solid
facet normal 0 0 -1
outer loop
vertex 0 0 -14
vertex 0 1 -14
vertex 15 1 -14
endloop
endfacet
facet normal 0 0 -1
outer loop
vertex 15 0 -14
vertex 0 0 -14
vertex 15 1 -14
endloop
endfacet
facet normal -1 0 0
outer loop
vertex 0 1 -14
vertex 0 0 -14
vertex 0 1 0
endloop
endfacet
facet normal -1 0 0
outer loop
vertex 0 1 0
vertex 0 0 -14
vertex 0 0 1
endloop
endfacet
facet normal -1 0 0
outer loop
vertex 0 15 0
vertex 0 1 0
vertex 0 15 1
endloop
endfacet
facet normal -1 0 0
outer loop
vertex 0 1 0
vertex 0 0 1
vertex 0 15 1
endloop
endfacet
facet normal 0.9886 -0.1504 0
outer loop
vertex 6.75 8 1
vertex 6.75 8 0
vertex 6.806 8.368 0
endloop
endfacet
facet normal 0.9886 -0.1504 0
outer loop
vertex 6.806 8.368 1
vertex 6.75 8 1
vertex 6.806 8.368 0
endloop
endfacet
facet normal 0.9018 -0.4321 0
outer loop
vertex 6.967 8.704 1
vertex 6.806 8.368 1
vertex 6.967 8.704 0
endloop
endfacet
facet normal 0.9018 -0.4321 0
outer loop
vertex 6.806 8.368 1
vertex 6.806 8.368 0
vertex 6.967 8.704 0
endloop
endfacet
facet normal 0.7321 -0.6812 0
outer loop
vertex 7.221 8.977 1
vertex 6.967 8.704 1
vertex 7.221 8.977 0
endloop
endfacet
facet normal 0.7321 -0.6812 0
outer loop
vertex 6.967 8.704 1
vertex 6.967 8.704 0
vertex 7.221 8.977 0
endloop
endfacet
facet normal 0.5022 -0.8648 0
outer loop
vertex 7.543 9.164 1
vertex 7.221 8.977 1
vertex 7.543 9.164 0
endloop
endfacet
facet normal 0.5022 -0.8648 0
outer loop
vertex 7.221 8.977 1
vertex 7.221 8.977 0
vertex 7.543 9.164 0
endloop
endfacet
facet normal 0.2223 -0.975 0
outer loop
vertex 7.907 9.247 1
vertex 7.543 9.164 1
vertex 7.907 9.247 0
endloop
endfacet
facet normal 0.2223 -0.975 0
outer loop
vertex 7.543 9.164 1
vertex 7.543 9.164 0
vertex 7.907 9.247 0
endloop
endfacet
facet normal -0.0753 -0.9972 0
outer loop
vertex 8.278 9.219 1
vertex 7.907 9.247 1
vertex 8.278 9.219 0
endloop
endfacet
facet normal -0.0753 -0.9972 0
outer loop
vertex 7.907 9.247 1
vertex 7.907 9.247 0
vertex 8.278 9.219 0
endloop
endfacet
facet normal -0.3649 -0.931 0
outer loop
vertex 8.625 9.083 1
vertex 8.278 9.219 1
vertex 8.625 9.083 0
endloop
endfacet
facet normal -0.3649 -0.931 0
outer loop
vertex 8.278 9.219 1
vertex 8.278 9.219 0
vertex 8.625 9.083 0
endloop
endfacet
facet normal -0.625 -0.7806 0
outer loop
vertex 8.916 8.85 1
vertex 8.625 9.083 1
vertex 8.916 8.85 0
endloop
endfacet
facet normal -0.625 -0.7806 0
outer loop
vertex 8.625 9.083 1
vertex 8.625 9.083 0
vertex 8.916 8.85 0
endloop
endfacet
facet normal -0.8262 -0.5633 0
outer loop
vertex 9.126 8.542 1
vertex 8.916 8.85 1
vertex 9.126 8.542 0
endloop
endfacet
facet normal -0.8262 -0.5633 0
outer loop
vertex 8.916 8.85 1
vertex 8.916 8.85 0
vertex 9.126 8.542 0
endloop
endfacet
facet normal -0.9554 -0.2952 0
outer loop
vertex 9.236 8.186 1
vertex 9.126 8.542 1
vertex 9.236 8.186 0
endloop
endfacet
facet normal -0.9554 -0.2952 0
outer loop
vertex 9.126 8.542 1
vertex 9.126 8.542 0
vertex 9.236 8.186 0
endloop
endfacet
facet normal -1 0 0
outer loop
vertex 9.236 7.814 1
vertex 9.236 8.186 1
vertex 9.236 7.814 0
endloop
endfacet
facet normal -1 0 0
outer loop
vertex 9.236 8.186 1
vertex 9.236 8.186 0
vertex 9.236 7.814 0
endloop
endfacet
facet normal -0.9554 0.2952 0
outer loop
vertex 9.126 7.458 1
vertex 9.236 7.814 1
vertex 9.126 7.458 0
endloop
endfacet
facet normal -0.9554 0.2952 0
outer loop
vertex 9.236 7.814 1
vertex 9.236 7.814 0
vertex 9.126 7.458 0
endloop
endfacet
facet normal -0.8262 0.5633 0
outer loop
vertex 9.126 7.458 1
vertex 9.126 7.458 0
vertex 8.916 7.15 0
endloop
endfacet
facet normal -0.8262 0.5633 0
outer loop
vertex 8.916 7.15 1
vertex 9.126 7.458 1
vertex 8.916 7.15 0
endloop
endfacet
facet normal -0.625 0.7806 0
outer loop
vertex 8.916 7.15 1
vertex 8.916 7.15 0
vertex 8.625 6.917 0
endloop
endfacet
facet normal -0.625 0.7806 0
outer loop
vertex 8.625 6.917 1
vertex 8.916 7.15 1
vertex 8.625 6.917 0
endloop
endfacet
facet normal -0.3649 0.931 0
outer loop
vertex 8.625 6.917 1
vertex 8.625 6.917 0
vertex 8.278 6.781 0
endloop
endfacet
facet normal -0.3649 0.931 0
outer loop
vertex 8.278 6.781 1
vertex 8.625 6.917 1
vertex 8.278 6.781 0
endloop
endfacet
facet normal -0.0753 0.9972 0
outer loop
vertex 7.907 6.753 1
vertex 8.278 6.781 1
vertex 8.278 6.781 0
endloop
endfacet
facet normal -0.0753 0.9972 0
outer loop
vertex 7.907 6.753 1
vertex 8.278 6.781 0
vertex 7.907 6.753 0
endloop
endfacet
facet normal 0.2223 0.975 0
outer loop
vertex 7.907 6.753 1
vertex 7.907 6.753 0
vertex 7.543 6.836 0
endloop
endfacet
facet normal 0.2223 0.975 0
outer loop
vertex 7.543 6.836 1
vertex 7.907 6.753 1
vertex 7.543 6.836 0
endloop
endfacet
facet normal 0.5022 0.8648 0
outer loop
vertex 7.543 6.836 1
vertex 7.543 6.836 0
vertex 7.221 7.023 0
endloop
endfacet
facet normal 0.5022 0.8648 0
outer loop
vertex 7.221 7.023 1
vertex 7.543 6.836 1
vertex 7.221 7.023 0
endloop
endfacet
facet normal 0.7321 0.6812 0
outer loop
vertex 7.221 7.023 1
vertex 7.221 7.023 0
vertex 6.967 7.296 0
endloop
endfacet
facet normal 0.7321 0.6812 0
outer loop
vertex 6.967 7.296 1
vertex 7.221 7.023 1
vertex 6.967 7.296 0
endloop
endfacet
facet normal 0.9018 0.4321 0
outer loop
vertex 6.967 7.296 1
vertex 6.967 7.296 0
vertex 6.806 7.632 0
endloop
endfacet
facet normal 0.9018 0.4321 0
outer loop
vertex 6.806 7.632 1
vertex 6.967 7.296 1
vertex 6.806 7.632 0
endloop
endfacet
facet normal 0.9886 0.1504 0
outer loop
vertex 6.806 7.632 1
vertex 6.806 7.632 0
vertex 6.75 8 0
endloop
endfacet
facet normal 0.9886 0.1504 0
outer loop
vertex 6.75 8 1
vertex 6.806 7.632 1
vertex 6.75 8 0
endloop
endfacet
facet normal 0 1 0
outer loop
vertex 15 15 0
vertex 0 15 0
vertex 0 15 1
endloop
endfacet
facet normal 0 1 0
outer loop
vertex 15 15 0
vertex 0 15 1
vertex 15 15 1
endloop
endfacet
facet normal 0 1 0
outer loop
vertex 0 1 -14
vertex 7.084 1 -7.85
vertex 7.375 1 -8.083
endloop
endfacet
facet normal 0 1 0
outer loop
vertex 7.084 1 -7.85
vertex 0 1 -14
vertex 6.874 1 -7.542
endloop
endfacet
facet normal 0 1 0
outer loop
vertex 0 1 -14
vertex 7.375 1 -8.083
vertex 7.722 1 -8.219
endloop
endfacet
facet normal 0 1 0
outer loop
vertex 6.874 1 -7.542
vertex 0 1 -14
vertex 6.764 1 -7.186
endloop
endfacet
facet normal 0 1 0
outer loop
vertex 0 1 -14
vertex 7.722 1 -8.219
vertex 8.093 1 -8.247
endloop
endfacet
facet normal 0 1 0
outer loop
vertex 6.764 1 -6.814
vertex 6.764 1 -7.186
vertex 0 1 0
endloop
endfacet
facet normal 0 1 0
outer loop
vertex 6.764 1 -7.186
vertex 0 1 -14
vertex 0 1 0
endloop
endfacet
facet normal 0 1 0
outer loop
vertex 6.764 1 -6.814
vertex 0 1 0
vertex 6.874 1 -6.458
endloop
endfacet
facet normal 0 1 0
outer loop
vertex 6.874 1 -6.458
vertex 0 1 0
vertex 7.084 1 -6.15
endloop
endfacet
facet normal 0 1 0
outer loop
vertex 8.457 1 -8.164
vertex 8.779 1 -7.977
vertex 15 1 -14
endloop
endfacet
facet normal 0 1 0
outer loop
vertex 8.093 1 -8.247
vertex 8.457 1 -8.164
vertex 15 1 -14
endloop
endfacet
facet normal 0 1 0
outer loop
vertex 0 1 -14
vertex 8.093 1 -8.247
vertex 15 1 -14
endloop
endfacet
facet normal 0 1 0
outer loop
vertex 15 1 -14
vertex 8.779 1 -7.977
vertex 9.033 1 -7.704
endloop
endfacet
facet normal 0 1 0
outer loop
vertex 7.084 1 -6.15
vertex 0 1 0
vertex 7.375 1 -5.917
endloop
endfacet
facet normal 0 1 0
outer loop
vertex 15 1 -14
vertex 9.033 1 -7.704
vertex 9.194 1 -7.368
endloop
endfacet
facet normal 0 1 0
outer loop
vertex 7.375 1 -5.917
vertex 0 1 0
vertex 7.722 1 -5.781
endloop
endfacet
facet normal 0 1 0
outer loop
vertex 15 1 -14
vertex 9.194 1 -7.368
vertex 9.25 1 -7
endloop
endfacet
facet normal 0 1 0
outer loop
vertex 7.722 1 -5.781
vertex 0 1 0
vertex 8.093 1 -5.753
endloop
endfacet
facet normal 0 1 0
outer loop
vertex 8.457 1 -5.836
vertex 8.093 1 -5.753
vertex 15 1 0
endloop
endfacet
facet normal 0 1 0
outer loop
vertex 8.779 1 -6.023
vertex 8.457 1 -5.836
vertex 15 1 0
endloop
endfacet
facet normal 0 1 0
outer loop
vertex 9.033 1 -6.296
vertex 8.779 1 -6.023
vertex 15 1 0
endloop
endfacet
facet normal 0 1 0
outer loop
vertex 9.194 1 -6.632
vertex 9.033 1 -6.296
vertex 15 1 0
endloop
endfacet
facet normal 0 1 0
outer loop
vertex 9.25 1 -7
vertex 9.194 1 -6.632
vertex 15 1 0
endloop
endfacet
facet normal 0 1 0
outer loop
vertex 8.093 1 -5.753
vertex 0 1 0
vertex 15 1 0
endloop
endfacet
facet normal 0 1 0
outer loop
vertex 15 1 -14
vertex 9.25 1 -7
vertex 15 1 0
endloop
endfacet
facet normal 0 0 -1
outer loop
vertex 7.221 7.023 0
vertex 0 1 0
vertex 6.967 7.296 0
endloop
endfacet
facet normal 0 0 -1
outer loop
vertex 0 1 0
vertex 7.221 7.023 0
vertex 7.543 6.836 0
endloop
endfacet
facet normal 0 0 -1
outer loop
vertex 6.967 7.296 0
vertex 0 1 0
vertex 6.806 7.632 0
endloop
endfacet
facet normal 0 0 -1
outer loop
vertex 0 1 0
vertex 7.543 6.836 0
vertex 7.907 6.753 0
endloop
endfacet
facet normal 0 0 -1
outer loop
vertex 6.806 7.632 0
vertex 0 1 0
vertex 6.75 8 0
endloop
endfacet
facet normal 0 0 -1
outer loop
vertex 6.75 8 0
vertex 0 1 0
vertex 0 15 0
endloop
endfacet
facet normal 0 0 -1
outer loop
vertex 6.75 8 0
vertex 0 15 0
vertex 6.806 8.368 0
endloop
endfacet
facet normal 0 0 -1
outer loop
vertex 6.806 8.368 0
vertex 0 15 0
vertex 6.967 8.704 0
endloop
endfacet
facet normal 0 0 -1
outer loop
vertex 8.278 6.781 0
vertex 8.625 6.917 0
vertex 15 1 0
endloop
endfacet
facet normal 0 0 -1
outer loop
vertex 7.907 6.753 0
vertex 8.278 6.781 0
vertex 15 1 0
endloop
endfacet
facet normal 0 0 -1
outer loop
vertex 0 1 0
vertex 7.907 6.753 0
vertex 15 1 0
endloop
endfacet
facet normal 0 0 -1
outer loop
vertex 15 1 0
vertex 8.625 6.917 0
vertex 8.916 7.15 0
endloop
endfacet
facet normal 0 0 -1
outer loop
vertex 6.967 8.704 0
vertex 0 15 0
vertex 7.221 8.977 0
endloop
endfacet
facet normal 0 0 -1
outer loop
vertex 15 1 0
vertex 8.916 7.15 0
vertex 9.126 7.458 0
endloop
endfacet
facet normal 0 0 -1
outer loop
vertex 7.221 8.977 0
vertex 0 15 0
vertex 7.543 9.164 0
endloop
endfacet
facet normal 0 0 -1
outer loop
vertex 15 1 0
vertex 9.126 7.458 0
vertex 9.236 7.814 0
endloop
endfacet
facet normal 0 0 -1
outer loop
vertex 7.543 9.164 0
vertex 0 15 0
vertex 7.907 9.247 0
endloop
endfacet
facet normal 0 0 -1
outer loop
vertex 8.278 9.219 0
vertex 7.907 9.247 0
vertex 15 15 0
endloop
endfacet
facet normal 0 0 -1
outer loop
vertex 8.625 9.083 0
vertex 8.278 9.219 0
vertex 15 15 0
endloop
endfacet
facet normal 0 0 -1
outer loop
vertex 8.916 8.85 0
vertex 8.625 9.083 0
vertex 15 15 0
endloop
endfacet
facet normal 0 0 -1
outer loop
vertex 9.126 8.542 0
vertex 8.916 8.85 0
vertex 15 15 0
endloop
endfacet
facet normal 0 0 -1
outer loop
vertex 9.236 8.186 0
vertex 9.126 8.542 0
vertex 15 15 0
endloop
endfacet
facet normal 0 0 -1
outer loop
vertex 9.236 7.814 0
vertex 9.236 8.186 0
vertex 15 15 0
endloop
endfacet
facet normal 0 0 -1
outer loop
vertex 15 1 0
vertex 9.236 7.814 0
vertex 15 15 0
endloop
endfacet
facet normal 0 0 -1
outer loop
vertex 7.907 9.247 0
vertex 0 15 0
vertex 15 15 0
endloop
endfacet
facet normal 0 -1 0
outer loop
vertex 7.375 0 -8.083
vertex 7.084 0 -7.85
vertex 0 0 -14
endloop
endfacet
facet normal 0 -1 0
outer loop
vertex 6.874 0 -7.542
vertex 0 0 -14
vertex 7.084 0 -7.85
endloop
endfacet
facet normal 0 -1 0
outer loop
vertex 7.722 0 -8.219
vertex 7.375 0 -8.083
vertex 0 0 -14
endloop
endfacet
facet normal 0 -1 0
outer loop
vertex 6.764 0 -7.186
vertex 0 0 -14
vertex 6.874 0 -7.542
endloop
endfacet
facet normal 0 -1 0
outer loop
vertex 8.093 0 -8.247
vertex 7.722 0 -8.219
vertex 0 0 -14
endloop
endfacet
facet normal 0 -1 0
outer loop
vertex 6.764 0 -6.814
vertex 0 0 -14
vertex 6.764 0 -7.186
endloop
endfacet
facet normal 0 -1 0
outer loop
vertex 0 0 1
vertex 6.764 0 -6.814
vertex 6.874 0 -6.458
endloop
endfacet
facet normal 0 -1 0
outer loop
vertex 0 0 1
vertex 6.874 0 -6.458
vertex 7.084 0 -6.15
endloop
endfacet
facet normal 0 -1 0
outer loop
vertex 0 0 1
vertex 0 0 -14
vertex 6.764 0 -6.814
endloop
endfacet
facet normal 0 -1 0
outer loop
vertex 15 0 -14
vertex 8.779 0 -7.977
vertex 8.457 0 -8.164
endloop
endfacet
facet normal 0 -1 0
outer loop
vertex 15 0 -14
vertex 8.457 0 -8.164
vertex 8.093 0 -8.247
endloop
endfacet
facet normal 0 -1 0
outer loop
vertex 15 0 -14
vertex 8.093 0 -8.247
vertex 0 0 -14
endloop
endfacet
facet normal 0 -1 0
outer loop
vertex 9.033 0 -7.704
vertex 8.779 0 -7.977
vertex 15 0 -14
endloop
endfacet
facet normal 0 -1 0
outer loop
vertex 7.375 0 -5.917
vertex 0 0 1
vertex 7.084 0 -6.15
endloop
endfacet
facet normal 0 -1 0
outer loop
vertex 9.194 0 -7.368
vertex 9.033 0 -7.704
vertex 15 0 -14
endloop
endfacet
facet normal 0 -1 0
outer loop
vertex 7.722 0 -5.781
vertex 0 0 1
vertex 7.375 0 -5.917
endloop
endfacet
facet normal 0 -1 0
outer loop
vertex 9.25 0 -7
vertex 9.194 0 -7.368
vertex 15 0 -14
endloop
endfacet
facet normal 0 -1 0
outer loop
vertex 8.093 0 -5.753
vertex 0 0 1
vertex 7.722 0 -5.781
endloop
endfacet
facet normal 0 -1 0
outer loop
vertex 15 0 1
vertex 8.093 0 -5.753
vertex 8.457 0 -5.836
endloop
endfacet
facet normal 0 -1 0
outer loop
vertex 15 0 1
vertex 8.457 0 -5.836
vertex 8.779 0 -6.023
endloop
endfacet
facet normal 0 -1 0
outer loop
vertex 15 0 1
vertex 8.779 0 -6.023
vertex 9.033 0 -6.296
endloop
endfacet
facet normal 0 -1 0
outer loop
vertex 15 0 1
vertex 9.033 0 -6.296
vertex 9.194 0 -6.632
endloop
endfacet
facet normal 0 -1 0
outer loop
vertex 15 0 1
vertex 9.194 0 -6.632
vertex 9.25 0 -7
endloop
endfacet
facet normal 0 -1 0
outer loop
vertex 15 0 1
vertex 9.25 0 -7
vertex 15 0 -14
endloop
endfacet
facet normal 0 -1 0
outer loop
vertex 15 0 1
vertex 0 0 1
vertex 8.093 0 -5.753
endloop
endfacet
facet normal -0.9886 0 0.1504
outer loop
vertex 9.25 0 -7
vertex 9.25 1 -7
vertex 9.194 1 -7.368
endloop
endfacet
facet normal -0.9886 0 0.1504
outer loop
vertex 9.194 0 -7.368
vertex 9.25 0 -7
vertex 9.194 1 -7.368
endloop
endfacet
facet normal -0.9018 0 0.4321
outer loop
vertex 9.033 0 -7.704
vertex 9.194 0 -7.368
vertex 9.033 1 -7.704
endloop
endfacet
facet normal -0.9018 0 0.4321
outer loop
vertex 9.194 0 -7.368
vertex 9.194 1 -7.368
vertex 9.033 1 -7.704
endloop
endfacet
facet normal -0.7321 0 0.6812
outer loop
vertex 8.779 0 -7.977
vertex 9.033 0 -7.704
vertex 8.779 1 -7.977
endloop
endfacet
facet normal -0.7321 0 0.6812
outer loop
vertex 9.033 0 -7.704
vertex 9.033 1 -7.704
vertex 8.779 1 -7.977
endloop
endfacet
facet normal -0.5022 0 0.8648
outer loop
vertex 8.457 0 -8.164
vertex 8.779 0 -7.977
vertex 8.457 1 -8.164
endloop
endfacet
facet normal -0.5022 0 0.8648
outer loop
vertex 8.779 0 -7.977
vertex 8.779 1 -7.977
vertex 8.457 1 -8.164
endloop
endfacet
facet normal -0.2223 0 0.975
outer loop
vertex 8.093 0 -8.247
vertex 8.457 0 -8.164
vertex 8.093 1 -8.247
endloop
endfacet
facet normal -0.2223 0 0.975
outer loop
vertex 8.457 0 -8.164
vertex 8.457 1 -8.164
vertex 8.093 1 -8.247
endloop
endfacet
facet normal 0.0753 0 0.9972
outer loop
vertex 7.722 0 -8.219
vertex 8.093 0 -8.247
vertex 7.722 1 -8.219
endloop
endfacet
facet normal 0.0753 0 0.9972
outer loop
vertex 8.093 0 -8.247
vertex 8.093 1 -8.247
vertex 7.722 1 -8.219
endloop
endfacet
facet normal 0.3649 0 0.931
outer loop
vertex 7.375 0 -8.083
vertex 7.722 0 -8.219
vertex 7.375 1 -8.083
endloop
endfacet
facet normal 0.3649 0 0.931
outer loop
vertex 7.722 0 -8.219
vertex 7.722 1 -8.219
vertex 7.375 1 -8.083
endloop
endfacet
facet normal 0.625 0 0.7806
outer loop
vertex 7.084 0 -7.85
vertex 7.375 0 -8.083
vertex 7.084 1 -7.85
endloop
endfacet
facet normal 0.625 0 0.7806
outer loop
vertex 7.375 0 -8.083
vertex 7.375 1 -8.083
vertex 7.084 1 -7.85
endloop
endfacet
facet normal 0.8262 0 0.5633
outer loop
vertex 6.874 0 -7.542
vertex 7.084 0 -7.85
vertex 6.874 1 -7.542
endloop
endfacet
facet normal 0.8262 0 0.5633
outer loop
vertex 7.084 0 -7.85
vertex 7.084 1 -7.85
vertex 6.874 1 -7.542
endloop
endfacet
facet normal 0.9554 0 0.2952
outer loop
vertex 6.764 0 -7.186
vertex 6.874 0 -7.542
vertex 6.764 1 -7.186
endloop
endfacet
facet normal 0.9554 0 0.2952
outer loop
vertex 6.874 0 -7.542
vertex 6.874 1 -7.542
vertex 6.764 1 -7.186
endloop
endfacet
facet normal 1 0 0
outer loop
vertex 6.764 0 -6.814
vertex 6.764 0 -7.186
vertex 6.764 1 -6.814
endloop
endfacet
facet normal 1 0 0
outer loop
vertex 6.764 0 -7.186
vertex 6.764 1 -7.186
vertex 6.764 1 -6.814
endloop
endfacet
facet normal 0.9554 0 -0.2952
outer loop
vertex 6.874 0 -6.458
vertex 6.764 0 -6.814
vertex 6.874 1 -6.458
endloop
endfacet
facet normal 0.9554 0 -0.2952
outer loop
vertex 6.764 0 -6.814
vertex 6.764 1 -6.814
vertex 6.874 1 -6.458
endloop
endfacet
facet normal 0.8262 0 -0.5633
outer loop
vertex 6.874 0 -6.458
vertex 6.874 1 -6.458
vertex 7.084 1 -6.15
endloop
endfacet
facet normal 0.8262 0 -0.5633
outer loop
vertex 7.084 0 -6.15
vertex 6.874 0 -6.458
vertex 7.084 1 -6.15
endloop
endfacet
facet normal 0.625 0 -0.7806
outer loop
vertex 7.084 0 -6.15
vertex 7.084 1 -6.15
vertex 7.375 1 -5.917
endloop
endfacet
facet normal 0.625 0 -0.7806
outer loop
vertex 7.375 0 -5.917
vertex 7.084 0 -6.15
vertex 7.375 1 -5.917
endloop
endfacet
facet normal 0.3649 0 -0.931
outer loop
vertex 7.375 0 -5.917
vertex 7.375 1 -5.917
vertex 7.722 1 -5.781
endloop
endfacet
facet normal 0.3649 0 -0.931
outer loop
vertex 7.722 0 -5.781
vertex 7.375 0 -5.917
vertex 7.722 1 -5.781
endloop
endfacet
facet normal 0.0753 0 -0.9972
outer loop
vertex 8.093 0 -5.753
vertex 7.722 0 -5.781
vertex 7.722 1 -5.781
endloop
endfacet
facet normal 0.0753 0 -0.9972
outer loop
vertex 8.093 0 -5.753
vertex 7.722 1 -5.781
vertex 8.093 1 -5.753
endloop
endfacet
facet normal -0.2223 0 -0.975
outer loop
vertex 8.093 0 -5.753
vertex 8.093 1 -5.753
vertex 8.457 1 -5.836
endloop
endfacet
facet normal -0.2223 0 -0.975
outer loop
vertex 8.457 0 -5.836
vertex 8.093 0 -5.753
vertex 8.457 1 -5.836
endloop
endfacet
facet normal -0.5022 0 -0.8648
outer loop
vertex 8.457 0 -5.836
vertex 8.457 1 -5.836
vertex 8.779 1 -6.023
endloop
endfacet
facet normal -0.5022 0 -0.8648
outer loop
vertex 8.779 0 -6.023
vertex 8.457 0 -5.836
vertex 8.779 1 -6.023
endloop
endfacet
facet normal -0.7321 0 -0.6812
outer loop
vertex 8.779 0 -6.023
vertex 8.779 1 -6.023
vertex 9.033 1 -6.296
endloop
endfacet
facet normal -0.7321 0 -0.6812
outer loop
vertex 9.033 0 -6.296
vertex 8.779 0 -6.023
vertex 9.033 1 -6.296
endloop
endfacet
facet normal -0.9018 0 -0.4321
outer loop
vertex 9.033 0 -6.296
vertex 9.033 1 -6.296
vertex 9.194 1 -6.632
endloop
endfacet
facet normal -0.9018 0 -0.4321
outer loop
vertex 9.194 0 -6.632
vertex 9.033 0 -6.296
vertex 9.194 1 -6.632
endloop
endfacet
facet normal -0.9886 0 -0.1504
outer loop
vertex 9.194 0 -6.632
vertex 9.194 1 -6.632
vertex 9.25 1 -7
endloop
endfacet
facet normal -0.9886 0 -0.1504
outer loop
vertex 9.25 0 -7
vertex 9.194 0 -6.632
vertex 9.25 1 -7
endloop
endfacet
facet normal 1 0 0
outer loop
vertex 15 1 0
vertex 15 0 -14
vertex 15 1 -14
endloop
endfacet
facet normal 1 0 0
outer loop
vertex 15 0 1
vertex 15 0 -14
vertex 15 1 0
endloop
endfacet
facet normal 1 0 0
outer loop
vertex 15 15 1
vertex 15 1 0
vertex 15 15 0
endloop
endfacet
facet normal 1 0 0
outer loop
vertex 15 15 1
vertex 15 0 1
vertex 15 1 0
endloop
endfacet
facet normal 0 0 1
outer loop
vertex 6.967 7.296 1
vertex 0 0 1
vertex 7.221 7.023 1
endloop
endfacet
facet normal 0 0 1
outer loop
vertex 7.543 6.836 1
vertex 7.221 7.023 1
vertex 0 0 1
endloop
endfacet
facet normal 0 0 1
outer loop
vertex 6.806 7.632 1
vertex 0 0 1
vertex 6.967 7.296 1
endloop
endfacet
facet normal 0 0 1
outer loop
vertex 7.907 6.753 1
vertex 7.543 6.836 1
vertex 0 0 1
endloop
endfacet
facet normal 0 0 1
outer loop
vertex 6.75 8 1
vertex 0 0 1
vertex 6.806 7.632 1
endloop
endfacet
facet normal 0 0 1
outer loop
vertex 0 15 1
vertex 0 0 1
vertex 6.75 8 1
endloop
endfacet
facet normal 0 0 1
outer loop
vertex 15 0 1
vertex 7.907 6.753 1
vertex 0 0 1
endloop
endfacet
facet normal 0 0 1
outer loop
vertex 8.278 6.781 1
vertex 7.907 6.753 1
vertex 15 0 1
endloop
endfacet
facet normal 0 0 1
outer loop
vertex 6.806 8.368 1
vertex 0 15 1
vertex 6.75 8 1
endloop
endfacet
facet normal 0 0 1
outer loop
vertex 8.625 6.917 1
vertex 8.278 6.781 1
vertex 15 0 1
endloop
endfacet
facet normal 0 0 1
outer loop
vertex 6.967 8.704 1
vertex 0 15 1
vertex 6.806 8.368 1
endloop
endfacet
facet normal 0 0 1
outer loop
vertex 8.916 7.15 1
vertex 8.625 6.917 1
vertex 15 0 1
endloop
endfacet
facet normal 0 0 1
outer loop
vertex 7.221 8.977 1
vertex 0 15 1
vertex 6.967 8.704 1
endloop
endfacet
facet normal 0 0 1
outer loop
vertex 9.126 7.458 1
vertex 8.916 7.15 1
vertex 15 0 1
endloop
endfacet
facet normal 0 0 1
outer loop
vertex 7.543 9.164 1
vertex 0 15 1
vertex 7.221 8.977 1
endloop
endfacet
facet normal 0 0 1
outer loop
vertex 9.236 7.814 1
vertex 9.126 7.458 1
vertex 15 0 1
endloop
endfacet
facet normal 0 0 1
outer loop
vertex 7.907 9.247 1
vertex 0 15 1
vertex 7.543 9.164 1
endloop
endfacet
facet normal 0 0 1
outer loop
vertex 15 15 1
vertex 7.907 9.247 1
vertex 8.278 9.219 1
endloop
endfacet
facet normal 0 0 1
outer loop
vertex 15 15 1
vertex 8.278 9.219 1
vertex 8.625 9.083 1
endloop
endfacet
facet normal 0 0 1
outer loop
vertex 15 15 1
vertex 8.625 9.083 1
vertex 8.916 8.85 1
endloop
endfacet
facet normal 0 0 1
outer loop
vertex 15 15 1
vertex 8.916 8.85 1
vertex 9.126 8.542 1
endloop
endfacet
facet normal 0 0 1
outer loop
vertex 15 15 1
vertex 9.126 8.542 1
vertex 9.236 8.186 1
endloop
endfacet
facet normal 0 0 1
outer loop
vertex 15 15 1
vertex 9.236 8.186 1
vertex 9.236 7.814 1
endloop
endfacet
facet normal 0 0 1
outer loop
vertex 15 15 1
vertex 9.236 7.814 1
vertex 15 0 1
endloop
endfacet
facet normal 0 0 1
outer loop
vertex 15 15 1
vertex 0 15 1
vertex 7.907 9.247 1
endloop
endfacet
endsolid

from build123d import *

# Parameters (mm, degrees)
SKETCH_1_W      = 15
SKETCH_1_H      = 15
EXTRUDE_1_DEPTH = 1
SKETCH_2_W      = 15
SKETCH_2_H      = 1
EXTRUDE_2_DEPTH = 15
M3X0_5_1_D      = 2.5
M3X0_5_2_D      = 2.5


with BuildPart() as part:
    # ｽｹｯﾁ1 → ﾎﾞｽ - 押し出し1 (new body)
    with BuildSketch(Plane.XY):
        with Locations((7.5, 7.5)):
            Rectangle(SKETCH_1_W, SKETCH_1_H)
    extrude(amount=EXTRUDE_1_DEPTH)

    # ｽｹｯﾁ2 → ﾎﾞｽ - 押し出し2 (add)
    with BuildSketch(Plane.XY.offset(1)):
        with Locations((7.5, 0.5)):
            Rectangle(SKETCH_2_W, SKETCH_2_H)
    extrude(amount=-EXTRUDE_2_DEPTH)

    # M3x0.5 ねじ穴1 (through all)
    with Locations(Plane.XY.offset(1)):
        with Locations((8, 8)):
            Hole(M3X0_5_1_D / 2)

    # M3x0.5 ねじ穴2 (through all)
    with Locations(Plane(origin=(0, 0, 0), x_dir=(-1, 0, 0), z_dir=(0, -1, 0))):
        with Locations((-8, 7)):
            Hole(M3X0_5_2_D / 2)


solid = part.part
